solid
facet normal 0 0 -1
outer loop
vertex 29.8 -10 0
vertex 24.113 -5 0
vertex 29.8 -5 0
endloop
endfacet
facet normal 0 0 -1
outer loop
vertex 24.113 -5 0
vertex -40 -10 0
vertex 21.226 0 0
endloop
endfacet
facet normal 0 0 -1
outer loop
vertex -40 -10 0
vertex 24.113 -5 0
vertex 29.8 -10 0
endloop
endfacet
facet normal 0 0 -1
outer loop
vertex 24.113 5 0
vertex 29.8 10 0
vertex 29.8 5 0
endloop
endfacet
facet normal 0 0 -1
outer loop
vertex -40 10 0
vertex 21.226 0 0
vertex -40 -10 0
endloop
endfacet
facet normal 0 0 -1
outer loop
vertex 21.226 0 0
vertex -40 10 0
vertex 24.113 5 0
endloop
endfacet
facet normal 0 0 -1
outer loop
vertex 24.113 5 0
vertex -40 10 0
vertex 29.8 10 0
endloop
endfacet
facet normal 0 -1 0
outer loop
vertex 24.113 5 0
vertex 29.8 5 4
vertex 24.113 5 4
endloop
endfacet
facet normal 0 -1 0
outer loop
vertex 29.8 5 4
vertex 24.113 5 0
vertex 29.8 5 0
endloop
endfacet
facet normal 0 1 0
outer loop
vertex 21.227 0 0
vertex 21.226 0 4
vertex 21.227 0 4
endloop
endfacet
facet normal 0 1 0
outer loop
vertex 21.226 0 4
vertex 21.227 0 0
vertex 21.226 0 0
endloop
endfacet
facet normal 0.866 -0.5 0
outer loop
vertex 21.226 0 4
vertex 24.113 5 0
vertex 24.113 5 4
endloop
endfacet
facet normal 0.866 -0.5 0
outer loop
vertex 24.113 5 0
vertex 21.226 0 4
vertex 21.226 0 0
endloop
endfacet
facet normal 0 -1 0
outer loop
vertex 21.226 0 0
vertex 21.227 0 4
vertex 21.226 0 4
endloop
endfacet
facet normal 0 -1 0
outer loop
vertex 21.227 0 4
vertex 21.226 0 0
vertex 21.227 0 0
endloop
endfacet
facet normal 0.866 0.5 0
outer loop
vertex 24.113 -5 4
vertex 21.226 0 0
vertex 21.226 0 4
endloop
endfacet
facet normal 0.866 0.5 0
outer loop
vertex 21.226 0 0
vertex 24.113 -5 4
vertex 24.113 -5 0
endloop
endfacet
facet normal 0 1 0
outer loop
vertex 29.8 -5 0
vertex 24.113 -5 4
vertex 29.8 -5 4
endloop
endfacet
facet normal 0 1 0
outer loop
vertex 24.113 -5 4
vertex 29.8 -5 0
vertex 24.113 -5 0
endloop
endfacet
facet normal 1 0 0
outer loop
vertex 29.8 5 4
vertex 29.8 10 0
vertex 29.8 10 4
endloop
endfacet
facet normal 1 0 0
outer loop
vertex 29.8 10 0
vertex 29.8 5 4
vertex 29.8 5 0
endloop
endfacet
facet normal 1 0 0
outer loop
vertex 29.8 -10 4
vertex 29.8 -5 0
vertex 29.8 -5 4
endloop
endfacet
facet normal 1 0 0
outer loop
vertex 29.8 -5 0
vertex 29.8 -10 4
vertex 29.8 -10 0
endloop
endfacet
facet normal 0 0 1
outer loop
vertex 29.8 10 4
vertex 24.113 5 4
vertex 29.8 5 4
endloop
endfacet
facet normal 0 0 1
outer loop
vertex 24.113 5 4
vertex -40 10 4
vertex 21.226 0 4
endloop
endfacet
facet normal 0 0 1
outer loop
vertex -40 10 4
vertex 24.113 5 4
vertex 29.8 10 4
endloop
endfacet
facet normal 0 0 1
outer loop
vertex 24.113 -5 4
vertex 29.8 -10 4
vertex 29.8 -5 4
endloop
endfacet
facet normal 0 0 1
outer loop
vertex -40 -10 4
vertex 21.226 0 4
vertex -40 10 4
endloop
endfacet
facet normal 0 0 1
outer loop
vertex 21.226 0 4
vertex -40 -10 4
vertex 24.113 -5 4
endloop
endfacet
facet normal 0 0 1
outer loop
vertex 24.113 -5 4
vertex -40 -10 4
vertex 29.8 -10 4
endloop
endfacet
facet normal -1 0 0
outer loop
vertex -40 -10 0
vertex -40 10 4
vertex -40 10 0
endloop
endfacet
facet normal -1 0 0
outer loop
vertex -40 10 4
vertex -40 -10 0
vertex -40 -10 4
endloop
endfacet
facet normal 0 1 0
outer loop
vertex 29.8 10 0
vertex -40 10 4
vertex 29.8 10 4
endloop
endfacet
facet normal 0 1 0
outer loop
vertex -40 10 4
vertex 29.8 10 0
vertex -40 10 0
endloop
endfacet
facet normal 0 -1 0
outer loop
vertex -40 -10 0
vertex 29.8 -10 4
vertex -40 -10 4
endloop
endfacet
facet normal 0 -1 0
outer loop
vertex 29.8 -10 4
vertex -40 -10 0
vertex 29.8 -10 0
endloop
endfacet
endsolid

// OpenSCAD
// file: hexnut.scad
module hexnut(flats=10, depth=5){
  sliceangle = 360 / 6;
  pointradius = flats / (2 * cos(sliceangle/2));
  flatoffset = flats * tan(sliceangle/2) / 2;
  union(){
    for(angle=[0:sliceangle:360]) {
      rotate(angle,[0,0,1]) linear_extrude(height=depth) polygon(points=[[0,-1],[flatoffset,flats/2],[-flatoffset,flats/2]],paths=[[0,1,2]]);
    }
  }
}
// main file
use<hexnut.scad>

difference() {
    translate([-40, -10, 0]) cube([69.8, 20, 4]);
    translate([27, 0, 0]) hexnut(flats = 10, depth = 5);
}
